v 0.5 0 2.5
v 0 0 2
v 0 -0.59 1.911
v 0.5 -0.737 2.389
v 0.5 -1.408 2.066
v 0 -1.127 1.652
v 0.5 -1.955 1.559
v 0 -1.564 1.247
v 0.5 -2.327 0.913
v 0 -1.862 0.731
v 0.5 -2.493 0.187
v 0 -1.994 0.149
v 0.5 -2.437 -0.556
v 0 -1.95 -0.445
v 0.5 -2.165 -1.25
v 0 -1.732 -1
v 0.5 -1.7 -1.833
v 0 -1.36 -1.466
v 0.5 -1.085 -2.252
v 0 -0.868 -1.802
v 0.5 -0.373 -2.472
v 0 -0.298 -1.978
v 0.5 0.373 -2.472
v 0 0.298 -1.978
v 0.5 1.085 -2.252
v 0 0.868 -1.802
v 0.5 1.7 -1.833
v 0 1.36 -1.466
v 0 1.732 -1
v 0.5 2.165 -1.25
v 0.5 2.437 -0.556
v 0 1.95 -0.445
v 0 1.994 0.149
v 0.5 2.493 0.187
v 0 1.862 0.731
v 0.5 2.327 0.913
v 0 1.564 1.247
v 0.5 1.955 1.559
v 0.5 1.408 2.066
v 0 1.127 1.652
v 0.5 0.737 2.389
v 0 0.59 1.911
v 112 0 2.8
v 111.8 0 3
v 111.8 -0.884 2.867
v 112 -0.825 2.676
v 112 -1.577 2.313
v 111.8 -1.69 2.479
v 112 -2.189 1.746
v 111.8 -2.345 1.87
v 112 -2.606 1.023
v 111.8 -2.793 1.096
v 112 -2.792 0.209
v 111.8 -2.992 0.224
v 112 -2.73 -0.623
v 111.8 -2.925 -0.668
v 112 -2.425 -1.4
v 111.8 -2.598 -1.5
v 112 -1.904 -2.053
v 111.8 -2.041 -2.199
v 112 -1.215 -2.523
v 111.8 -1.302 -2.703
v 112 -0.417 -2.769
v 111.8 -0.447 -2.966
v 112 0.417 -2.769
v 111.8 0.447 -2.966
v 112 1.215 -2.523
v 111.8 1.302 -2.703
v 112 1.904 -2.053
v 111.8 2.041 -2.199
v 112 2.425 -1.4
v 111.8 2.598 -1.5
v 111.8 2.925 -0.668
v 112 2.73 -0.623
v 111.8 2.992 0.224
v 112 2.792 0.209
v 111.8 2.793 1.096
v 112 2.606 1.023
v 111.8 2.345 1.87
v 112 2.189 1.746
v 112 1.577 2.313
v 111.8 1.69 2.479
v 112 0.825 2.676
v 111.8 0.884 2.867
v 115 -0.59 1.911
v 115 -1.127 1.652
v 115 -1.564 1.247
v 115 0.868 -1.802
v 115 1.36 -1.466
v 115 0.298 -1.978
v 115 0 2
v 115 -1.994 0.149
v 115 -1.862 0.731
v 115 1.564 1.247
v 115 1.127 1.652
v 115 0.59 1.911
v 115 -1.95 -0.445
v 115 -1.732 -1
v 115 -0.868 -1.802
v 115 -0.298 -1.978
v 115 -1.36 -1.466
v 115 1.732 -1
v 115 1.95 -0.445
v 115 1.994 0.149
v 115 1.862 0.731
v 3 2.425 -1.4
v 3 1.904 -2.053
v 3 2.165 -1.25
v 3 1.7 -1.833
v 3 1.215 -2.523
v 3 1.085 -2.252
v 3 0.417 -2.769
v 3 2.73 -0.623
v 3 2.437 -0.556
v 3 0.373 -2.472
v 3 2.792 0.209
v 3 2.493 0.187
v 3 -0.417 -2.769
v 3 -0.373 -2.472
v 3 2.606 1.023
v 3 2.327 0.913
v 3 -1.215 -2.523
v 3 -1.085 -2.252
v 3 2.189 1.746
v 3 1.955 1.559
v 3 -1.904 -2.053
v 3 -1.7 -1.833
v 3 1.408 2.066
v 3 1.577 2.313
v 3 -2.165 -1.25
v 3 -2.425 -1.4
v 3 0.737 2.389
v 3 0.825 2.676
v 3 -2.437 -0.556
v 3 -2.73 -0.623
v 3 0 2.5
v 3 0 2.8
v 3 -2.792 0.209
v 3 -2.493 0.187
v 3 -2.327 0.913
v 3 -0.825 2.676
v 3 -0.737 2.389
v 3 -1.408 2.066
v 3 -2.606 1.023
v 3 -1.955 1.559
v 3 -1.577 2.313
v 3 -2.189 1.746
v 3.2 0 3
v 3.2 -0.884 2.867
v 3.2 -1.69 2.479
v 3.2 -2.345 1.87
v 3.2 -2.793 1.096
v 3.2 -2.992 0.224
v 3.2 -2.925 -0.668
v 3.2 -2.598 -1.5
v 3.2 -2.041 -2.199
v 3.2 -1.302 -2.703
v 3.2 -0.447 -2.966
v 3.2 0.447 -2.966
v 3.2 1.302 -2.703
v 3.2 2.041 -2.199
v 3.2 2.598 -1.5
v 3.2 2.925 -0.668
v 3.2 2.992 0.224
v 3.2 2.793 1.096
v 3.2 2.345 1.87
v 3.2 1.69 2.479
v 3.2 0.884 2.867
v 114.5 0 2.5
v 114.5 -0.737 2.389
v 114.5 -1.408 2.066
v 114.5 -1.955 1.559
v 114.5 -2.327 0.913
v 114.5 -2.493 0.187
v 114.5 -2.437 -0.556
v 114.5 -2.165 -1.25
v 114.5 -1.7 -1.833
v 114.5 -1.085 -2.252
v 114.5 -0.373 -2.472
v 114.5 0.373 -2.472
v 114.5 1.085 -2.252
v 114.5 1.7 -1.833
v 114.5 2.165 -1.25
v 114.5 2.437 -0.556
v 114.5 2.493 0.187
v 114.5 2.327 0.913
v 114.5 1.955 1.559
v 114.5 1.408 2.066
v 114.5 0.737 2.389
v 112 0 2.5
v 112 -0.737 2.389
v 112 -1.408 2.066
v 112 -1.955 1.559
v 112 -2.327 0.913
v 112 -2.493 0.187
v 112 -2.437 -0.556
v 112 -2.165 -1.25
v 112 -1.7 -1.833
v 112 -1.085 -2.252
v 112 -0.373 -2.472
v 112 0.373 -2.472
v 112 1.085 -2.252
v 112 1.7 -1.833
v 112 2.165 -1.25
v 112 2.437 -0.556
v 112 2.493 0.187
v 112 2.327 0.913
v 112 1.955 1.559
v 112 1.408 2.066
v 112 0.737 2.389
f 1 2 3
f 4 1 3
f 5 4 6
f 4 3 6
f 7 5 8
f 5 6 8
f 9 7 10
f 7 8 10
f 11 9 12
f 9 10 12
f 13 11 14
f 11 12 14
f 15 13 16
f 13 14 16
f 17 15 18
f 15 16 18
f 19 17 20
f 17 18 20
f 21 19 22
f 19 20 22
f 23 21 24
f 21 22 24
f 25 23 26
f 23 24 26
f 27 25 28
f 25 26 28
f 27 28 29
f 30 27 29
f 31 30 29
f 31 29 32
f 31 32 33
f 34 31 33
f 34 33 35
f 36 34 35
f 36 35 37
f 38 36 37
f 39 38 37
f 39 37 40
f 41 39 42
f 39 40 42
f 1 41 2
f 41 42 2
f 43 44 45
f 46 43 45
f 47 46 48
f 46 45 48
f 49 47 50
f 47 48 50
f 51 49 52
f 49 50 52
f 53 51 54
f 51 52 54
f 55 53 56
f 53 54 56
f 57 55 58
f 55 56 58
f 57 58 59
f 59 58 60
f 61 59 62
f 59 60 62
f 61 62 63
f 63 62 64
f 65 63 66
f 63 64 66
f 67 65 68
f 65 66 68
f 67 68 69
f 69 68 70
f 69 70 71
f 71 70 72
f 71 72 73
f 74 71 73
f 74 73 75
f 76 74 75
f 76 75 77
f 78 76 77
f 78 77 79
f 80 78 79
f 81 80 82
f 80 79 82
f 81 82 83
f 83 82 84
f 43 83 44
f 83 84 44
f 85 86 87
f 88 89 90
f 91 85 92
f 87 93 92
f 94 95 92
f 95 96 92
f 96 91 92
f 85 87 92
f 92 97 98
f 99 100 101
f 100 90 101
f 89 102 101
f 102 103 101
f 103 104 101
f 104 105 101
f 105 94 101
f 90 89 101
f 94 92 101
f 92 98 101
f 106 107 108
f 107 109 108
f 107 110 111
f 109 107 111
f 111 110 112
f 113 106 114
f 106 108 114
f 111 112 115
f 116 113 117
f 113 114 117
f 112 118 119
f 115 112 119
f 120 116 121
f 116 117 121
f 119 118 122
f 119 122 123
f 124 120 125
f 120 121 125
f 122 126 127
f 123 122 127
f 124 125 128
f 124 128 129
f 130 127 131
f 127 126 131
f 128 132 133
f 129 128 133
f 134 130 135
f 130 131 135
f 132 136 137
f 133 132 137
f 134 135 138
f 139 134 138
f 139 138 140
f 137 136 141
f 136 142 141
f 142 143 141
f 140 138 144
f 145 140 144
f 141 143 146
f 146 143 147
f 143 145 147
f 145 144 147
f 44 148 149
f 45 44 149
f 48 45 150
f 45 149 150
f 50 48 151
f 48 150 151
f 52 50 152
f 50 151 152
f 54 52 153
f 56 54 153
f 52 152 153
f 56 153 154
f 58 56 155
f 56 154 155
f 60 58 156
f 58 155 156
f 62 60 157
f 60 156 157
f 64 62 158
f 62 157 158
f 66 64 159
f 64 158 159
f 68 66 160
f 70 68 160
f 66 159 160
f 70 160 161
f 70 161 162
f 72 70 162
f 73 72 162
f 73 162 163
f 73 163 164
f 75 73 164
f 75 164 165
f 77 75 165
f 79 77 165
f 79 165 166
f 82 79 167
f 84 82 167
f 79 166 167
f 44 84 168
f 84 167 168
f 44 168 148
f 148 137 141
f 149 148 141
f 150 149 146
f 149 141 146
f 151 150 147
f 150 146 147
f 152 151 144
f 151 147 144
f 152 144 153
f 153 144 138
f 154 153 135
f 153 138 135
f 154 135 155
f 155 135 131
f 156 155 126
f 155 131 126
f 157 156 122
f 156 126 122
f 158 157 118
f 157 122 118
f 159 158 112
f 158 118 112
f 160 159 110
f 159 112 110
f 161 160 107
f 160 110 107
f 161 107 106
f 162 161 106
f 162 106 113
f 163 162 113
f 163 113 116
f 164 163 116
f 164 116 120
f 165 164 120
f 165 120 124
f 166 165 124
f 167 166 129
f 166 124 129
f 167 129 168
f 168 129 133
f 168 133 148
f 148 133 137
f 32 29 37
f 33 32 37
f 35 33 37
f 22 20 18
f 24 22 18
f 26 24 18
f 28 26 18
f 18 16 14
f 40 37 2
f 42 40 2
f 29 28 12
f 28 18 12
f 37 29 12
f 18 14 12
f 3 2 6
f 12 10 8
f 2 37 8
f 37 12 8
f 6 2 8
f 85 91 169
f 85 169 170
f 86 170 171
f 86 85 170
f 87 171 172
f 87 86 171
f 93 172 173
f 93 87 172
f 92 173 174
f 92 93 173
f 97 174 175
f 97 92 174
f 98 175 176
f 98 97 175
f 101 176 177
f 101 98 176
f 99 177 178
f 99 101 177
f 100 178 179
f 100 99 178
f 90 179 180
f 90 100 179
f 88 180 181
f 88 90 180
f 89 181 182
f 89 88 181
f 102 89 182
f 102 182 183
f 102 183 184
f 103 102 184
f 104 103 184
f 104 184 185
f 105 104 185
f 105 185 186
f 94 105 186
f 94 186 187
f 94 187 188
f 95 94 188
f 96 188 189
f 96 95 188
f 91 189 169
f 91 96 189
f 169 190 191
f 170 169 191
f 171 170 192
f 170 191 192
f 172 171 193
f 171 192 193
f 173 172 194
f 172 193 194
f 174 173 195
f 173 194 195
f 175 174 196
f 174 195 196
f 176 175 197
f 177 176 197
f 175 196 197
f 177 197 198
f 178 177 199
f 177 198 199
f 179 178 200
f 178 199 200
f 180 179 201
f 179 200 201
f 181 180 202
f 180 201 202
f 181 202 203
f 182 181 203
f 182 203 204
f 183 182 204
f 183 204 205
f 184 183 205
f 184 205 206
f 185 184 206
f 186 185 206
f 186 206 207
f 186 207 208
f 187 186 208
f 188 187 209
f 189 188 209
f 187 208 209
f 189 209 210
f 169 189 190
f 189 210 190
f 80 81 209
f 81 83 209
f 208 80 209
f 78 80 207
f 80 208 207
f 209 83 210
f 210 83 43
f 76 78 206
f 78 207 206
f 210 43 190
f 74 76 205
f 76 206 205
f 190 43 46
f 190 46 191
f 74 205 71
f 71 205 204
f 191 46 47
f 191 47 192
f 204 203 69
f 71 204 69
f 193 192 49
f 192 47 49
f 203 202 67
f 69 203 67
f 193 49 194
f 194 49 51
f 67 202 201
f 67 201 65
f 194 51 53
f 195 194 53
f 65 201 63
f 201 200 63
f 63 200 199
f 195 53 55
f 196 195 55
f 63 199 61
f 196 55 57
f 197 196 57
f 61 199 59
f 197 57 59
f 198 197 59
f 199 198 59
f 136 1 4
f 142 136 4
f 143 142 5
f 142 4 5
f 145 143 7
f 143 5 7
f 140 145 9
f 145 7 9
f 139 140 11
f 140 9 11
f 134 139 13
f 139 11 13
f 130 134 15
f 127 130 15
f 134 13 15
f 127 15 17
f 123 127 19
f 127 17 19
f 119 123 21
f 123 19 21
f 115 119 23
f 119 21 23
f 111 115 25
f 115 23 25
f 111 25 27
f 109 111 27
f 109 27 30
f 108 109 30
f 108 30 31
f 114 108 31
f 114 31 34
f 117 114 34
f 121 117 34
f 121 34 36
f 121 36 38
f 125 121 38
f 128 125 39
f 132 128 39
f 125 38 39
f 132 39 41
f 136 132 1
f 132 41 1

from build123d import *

# Parameters (mm, degrees)
CHAMFER1_SIZE = 0.2
CHAMFER2_SIZE = 0.2
CHAMFER3_SIZE = 0.5
CHAMFER4_SIZE = 0.5


with BuildPart() as part:
    # Sketch1 → Revolve1 (revolve)
    with BuildSketch(Plane.XY):
        Polygon((0, 0), (115, 0), (115, 2.5), (112, 2.5), (112, 3), (3, 3), (3, 2.5), (0, 2.5), align=None)
    revolve(axis=Axis((0, 0, 0), (1, 0, 0)))

    # Chamfer1
    chamfer1_edges = [part.edges().sort_by_distance(p)[0] for p in [
        (112, -3, 0),
    ]]
    chamfer(chamfer1_edges, length=CHAMFER1_SIZE)

    # Chamfer2
    chamfer2_edges = [part.edges().sort_by_distance(p)[0] for p in [
        (3, -3, 0),
    ]]
    chamfer(chamfer2_edges, length=CHAMFER2_SIZE)

    # Chamfer3
    chamfer3_edges = [part.edges().sort_by_distance(p)[0] for p in [
        (0, -2.5, 0),
    ]]
    chamfer(chamfer3_edges, length=CHAMFER3_SIZE)

    # Chamfer4
    chamfer4_edges = [part.edges().sort_by_distance(p)[0] for p in [
        (115, -2.5, 0),
    ]]
    chamfer(chamfer4_edges, length=CHAMFER4_SIZE)


solid = part.part
